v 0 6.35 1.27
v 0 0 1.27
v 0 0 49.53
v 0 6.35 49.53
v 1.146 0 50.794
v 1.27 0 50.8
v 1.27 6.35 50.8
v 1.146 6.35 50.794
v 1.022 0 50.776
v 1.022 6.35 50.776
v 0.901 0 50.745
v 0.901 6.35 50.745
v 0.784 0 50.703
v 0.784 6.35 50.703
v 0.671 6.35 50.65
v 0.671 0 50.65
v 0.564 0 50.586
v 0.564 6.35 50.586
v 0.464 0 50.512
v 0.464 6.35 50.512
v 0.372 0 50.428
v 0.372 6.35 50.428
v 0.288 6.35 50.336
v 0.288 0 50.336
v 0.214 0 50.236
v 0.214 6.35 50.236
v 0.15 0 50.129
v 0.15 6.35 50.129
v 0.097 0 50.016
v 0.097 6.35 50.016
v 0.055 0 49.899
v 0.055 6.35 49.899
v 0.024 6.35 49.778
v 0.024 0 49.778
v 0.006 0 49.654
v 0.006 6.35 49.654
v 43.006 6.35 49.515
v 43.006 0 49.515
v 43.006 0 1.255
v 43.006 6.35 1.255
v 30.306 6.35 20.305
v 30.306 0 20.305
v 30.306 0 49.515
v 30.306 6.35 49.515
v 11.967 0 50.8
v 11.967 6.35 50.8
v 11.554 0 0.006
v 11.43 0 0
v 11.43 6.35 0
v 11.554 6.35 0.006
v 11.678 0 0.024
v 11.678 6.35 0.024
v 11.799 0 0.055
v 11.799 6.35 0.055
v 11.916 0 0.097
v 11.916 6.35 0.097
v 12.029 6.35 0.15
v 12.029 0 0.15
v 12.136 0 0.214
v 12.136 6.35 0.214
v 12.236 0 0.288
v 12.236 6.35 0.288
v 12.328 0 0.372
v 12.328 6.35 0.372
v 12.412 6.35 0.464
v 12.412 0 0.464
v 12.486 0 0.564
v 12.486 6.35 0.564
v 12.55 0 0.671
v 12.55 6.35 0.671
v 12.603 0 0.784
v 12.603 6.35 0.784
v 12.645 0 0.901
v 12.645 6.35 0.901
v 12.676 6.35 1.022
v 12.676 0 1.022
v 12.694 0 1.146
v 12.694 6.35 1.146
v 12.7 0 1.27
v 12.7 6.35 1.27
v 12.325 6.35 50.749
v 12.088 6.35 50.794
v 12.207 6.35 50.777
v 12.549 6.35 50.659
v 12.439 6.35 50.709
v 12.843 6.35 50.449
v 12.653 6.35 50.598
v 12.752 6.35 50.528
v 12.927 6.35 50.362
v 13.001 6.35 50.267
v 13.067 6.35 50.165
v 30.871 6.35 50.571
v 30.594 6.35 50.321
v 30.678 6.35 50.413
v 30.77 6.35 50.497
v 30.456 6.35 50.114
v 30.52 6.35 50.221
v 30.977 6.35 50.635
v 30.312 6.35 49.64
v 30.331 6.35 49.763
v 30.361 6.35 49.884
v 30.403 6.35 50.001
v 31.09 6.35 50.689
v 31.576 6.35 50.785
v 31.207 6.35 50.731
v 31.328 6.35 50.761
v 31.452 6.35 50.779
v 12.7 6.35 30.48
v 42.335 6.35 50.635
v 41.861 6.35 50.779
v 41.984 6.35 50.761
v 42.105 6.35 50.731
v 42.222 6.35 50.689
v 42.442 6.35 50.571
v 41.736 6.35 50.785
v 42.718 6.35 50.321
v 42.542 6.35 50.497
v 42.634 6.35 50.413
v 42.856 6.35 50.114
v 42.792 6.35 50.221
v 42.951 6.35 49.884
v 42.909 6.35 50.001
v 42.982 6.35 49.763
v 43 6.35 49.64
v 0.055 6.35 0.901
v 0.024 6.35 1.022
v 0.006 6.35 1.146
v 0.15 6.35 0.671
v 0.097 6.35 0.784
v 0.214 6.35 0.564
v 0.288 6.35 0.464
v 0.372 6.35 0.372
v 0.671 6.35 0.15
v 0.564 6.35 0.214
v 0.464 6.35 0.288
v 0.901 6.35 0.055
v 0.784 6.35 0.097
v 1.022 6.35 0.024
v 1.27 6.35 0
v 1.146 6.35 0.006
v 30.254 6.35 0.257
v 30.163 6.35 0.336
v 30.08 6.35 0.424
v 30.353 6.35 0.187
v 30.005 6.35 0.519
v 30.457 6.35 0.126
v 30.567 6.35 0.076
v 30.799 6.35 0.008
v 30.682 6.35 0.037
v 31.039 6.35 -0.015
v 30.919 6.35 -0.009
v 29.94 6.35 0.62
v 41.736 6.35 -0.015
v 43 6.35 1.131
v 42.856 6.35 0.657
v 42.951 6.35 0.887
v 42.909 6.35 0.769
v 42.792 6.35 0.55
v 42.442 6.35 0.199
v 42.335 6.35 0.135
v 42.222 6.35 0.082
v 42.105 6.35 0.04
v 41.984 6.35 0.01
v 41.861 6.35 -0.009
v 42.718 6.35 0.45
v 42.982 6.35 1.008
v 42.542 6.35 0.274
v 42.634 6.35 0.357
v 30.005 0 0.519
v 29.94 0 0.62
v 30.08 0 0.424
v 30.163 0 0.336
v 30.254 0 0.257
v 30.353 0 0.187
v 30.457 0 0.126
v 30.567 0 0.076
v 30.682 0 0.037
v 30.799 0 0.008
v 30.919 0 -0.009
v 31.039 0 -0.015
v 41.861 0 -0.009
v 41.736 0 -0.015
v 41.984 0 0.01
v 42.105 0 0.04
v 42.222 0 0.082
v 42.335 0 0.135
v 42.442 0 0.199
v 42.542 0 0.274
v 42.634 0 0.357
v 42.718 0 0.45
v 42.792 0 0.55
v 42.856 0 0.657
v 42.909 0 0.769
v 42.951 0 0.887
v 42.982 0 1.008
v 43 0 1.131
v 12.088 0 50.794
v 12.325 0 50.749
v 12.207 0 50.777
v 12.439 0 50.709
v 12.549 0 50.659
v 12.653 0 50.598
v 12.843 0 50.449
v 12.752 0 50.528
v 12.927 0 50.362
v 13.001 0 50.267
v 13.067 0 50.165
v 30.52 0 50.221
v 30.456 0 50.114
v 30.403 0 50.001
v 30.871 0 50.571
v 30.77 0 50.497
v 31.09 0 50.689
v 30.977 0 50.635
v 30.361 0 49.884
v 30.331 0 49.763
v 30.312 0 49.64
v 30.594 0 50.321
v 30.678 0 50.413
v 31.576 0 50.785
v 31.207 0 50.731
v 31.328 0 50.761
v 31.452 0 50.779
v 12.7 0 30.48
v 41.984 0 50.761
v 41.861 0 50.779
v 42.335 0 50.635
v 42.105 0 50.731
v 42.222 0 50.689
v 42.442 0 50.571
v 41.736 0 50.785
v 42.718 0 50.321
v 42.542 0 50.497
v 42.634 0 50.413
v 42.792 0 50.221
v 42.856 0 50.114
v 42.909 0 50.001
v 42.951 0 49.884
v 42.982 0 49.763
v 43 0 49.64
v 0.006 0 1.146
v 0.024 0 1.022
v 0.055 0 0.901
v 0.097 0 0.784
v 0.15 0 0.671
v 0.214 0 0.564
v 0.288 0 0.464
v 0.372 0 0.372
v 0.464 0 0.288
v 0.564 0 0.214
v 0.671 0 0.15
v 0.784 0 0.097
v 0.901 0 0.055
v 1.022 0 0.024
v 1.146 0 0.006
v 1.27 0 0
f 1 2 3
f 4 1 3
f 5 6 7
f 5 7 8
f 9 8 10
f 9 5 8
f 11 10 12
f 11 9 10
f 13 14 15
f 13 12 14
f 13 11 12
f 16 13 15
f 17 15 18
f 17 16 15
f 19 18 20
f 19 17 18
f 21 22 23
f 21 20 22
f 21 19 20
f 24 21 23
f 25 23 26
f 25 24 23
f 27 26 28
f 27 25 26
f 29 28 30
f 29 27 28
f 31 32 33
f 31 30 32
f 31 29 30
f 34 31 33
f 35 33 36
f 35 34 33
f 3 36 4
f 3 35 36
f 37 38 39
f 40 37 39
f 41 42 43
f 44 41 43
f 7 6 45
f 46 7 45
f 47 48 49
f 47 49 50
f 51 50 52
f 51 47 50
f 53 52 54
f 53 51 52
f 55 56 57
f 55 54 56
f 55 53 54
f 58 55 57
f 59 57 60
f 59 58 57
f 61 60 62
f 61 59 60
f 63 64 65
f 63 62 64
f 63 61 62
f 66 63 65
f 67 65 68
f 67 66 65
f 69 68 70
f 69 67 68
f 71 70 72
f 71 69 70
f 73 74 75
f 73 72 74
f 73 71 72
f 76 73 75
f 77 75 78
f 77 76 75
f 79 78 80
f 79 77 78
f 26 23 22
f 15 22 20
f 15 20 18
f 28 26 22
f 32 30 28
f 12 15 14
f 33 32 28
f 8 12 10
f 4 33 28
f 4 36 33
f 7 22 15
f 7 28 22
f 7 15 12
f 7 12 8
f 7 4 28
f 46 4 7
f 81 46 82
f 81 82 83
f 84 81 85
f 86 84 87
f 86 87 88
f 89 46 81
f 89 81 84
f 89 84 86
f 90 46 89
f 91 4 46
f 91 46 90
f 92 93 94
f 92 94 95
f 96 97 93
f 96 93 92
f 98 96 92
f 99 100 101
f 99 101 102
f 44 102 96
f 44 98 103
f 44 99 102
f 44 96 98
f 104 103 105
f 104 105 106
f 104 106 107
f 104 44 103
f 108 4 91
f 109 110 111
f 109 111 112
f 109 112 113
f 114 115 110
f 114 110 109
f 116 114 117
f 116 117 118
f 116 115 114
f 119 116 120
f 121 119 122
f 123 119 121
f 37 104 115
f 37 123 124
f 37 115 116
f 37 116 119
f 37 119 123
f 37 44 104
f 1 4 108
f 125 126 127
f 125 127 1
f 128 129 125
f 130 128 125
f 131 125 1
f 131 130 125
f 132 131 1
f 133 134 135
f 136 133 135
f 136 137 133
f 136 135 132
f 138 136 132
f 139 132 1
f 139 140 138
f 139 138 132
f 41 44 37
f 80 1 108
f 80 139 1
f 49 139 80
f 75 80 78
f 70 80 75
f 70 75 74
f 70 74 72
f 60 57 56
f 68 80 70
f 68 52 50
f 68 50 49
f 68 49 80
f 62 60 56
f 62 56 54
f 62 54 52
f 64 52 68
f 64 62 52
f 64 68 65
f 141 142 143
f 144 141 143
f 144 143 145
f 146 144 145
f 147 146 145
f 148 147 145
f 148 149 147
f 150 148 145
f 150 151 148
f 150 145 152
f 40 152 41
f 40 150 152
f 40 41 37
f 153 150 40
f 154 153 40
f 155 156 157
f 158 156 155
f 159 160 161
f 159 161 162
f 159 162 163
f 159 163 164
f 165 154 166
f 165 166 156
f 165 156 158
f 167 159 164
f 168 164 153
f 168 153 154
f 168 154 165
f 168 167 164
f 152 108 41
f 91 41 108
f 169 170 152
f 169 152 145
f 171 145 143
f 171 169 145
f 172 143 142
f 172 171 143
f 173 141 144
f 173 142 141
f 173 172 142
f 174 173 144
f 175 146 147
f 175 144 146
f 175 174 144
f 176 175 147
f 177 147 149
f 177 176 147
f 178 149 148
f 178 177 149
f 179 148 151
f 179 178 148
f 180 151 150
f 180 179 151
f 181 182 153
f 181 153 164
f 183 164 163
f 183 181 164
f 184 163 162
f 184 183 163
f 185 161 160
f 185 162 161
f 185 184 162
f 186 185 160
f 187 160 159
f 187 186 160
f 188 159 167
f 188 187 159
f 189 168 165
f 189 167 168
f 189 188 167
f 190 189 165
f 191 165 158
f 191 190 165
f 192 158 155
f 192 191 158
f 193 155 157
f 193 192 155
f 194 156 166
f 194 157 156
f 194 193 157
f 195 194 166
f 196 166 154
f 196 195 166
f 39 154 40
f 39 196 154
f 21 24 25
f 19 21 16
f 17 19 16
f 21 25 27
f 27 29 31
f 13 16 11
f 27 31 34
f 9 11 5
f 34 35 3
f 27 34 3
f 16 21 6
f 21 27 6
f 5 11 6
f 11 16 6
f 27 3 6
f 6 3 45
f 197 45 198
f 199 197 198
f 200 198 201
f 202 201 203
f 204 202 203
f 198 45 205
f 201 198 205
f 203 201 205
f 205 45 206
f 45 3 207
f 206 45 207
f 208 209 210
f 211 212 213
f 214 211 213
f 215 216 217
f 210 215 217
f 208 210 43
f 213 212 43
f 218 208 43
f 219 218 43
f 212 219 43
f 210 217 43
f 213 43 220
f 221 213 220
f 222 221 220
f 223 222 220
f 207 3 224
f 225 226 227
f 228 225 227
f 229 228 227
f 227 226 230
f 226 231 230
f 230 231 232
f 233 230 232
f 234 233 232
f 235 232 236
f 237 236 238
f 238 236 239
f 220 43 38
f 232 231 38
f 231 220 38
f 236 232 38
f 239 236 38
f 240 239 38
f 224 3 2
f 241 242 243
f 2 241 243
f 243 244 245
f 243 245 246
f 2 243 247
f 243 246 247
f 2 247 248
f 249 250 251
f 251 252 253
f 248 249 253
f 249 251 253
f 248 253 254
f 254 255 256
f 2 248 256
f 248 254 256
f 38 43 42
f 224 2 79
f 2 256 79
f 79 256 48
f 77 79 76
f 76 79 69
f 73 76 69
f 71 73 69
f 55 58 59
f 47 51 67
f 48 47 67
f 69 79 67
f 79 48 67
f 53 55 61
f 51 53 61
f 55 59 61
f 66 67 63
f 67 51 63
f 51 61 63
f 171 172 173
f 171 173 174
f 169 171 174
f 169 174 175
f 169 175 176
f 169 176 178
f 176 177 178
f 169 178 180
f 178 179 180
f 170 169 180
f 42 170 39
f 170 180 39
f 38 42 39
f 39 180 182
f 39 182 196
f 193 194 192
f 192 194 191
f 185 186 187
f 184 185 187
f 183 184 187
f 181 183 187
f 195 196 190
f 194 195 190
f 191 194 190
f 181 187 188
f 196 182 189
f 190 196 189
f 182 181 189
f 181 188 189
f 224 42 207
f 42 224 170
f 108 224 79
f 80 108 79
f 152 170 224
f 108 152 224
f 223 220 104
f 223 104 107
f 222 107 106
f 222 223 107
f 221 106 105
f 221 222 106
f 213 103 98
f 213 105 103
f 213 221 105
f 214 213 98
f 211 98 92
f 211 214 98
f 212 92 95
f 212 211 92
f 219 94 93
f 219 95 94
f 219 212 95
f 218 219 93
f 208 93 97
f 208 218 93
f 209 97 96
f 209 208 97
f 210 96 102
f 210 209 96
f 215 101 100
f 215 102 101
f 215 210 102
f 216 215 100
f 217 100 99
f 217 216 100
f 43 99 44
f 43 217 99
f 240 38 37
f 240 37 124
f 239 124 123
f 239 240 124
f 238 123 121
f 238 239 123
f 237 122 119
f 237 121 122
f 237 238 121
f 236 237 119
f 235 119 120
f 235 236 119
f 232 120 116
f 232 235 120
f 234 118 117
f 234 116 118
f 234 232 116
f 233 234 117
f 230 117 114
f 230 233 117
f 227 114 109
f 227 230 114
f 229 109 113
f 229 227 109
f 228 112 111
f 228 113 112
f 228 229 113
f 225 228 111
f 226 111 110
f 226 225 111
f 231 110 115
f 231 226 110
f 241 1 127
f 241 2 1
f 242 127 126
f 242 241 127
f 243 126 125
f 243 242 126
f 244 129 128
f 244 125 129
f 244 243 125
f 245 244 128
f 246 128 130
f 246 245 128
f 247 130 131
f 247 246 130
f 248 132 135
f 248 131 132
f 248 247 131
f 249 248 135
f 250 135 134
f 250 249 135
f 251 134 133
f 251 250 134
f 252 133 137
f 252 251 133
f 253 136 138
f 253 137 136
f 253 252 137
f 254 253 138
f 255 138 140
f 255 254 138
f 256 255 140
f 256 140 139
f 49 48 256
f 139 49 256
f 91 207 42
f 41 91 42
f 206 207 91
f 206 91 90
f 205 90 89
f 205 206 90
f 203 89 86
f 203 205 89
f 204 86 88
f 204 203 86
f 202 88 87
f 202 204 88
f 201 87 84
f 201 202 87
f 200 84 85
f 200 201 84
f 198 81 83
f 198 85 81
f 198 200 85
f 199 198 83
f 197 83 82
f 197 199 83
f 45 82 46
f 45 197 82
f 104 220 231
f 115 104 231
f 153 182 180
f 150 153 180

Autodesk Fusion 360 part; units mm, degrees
sketch "Sketch1" plane through (0, 0, 0) normal (0, 1, 0) x (1, 0, 0)
  line L0 (0, -1.27) -> (0, -49.53)
  line L1 (1.27, -50.8) -> (11.9668, -50.8)
  line L2 (13.0666, -50.165) -> (30.3061, -20.3053)
  line L3 (30.3061, -20.3053) -> (30.3061, -49.5153)
  line L4 (31.5761, -50.7853) -> (41.7361, -50.7853)
  line L5 (43.0061, -49.5153) -> (43.0061, -1.2553)
  line L6 (41.7361, 0.0147) -> (31.0393, 0.0147)
  line L7 (29.9395, -0.6203) -> (12.7, -30.48)
  line L8 (12.7, -30.48) -> (12.7, -1.27)
  line L9 (11.43, 0) -> (1.27, 0)
  arc A0 (0, -49.53) -> (1.27, -50.8) centre (1.27, -49.53) ccw
  arc A1 (1.27, 0) -> (0, -1.27) centre (1.27, -1.27) ccw
  arc A2 (12.7, -1.27) -> (11.43, 0) centre (11.43, -1.27) ccw
  arc A3 (11.9668, -50.8) -> (13.0666, -50.165) centre (11.9668, -49.53) ccw
  arc A4 (30.3061, -49.5153) -> (31.5761, -50.7853) centre (31.5761, -49.5153) ccw
  arc A5 (41.7361, -50.7853) -> (43.0061, -49.5153) centre (41.7361, -49.5153) ccw
  arc A6 (43.0061, -1.2553) -> (41.7361, 0.0147) centre (41.7361, -1.2553) ccw
  arc A7 (31.0393, 0.0147) -> (29.9395, -0.6203) centre (31.0393, -1.2553) ccw
  point P0 (0, -50.8)
  point P1 (12.7, -50.8)
  point P2 (30.3061, -50.7853)
  point P3 (43.0061, -50.7853)
  point P4 (43.0061, 0.0147)
  point P5 (30.3061, 0.0147)
  point P6 (12.7, 0)
  dimension "d6" = 12.7
  dimension "d7" = 12.7
  dimension "d8" = 12.7
  dimension "d9" = 12.7
  dimension "d11" = 30
  dimension "d12" = 30
  dimension "d13" = 50.8
  dimension "d14" = 50.8
  dimension "d15" = 1.27
  dimension "d16" = 1.27
  dimension "d19" = 43.0061
extrude "Extrude1" add sketch "Sketch1" along normal blind 6.35
